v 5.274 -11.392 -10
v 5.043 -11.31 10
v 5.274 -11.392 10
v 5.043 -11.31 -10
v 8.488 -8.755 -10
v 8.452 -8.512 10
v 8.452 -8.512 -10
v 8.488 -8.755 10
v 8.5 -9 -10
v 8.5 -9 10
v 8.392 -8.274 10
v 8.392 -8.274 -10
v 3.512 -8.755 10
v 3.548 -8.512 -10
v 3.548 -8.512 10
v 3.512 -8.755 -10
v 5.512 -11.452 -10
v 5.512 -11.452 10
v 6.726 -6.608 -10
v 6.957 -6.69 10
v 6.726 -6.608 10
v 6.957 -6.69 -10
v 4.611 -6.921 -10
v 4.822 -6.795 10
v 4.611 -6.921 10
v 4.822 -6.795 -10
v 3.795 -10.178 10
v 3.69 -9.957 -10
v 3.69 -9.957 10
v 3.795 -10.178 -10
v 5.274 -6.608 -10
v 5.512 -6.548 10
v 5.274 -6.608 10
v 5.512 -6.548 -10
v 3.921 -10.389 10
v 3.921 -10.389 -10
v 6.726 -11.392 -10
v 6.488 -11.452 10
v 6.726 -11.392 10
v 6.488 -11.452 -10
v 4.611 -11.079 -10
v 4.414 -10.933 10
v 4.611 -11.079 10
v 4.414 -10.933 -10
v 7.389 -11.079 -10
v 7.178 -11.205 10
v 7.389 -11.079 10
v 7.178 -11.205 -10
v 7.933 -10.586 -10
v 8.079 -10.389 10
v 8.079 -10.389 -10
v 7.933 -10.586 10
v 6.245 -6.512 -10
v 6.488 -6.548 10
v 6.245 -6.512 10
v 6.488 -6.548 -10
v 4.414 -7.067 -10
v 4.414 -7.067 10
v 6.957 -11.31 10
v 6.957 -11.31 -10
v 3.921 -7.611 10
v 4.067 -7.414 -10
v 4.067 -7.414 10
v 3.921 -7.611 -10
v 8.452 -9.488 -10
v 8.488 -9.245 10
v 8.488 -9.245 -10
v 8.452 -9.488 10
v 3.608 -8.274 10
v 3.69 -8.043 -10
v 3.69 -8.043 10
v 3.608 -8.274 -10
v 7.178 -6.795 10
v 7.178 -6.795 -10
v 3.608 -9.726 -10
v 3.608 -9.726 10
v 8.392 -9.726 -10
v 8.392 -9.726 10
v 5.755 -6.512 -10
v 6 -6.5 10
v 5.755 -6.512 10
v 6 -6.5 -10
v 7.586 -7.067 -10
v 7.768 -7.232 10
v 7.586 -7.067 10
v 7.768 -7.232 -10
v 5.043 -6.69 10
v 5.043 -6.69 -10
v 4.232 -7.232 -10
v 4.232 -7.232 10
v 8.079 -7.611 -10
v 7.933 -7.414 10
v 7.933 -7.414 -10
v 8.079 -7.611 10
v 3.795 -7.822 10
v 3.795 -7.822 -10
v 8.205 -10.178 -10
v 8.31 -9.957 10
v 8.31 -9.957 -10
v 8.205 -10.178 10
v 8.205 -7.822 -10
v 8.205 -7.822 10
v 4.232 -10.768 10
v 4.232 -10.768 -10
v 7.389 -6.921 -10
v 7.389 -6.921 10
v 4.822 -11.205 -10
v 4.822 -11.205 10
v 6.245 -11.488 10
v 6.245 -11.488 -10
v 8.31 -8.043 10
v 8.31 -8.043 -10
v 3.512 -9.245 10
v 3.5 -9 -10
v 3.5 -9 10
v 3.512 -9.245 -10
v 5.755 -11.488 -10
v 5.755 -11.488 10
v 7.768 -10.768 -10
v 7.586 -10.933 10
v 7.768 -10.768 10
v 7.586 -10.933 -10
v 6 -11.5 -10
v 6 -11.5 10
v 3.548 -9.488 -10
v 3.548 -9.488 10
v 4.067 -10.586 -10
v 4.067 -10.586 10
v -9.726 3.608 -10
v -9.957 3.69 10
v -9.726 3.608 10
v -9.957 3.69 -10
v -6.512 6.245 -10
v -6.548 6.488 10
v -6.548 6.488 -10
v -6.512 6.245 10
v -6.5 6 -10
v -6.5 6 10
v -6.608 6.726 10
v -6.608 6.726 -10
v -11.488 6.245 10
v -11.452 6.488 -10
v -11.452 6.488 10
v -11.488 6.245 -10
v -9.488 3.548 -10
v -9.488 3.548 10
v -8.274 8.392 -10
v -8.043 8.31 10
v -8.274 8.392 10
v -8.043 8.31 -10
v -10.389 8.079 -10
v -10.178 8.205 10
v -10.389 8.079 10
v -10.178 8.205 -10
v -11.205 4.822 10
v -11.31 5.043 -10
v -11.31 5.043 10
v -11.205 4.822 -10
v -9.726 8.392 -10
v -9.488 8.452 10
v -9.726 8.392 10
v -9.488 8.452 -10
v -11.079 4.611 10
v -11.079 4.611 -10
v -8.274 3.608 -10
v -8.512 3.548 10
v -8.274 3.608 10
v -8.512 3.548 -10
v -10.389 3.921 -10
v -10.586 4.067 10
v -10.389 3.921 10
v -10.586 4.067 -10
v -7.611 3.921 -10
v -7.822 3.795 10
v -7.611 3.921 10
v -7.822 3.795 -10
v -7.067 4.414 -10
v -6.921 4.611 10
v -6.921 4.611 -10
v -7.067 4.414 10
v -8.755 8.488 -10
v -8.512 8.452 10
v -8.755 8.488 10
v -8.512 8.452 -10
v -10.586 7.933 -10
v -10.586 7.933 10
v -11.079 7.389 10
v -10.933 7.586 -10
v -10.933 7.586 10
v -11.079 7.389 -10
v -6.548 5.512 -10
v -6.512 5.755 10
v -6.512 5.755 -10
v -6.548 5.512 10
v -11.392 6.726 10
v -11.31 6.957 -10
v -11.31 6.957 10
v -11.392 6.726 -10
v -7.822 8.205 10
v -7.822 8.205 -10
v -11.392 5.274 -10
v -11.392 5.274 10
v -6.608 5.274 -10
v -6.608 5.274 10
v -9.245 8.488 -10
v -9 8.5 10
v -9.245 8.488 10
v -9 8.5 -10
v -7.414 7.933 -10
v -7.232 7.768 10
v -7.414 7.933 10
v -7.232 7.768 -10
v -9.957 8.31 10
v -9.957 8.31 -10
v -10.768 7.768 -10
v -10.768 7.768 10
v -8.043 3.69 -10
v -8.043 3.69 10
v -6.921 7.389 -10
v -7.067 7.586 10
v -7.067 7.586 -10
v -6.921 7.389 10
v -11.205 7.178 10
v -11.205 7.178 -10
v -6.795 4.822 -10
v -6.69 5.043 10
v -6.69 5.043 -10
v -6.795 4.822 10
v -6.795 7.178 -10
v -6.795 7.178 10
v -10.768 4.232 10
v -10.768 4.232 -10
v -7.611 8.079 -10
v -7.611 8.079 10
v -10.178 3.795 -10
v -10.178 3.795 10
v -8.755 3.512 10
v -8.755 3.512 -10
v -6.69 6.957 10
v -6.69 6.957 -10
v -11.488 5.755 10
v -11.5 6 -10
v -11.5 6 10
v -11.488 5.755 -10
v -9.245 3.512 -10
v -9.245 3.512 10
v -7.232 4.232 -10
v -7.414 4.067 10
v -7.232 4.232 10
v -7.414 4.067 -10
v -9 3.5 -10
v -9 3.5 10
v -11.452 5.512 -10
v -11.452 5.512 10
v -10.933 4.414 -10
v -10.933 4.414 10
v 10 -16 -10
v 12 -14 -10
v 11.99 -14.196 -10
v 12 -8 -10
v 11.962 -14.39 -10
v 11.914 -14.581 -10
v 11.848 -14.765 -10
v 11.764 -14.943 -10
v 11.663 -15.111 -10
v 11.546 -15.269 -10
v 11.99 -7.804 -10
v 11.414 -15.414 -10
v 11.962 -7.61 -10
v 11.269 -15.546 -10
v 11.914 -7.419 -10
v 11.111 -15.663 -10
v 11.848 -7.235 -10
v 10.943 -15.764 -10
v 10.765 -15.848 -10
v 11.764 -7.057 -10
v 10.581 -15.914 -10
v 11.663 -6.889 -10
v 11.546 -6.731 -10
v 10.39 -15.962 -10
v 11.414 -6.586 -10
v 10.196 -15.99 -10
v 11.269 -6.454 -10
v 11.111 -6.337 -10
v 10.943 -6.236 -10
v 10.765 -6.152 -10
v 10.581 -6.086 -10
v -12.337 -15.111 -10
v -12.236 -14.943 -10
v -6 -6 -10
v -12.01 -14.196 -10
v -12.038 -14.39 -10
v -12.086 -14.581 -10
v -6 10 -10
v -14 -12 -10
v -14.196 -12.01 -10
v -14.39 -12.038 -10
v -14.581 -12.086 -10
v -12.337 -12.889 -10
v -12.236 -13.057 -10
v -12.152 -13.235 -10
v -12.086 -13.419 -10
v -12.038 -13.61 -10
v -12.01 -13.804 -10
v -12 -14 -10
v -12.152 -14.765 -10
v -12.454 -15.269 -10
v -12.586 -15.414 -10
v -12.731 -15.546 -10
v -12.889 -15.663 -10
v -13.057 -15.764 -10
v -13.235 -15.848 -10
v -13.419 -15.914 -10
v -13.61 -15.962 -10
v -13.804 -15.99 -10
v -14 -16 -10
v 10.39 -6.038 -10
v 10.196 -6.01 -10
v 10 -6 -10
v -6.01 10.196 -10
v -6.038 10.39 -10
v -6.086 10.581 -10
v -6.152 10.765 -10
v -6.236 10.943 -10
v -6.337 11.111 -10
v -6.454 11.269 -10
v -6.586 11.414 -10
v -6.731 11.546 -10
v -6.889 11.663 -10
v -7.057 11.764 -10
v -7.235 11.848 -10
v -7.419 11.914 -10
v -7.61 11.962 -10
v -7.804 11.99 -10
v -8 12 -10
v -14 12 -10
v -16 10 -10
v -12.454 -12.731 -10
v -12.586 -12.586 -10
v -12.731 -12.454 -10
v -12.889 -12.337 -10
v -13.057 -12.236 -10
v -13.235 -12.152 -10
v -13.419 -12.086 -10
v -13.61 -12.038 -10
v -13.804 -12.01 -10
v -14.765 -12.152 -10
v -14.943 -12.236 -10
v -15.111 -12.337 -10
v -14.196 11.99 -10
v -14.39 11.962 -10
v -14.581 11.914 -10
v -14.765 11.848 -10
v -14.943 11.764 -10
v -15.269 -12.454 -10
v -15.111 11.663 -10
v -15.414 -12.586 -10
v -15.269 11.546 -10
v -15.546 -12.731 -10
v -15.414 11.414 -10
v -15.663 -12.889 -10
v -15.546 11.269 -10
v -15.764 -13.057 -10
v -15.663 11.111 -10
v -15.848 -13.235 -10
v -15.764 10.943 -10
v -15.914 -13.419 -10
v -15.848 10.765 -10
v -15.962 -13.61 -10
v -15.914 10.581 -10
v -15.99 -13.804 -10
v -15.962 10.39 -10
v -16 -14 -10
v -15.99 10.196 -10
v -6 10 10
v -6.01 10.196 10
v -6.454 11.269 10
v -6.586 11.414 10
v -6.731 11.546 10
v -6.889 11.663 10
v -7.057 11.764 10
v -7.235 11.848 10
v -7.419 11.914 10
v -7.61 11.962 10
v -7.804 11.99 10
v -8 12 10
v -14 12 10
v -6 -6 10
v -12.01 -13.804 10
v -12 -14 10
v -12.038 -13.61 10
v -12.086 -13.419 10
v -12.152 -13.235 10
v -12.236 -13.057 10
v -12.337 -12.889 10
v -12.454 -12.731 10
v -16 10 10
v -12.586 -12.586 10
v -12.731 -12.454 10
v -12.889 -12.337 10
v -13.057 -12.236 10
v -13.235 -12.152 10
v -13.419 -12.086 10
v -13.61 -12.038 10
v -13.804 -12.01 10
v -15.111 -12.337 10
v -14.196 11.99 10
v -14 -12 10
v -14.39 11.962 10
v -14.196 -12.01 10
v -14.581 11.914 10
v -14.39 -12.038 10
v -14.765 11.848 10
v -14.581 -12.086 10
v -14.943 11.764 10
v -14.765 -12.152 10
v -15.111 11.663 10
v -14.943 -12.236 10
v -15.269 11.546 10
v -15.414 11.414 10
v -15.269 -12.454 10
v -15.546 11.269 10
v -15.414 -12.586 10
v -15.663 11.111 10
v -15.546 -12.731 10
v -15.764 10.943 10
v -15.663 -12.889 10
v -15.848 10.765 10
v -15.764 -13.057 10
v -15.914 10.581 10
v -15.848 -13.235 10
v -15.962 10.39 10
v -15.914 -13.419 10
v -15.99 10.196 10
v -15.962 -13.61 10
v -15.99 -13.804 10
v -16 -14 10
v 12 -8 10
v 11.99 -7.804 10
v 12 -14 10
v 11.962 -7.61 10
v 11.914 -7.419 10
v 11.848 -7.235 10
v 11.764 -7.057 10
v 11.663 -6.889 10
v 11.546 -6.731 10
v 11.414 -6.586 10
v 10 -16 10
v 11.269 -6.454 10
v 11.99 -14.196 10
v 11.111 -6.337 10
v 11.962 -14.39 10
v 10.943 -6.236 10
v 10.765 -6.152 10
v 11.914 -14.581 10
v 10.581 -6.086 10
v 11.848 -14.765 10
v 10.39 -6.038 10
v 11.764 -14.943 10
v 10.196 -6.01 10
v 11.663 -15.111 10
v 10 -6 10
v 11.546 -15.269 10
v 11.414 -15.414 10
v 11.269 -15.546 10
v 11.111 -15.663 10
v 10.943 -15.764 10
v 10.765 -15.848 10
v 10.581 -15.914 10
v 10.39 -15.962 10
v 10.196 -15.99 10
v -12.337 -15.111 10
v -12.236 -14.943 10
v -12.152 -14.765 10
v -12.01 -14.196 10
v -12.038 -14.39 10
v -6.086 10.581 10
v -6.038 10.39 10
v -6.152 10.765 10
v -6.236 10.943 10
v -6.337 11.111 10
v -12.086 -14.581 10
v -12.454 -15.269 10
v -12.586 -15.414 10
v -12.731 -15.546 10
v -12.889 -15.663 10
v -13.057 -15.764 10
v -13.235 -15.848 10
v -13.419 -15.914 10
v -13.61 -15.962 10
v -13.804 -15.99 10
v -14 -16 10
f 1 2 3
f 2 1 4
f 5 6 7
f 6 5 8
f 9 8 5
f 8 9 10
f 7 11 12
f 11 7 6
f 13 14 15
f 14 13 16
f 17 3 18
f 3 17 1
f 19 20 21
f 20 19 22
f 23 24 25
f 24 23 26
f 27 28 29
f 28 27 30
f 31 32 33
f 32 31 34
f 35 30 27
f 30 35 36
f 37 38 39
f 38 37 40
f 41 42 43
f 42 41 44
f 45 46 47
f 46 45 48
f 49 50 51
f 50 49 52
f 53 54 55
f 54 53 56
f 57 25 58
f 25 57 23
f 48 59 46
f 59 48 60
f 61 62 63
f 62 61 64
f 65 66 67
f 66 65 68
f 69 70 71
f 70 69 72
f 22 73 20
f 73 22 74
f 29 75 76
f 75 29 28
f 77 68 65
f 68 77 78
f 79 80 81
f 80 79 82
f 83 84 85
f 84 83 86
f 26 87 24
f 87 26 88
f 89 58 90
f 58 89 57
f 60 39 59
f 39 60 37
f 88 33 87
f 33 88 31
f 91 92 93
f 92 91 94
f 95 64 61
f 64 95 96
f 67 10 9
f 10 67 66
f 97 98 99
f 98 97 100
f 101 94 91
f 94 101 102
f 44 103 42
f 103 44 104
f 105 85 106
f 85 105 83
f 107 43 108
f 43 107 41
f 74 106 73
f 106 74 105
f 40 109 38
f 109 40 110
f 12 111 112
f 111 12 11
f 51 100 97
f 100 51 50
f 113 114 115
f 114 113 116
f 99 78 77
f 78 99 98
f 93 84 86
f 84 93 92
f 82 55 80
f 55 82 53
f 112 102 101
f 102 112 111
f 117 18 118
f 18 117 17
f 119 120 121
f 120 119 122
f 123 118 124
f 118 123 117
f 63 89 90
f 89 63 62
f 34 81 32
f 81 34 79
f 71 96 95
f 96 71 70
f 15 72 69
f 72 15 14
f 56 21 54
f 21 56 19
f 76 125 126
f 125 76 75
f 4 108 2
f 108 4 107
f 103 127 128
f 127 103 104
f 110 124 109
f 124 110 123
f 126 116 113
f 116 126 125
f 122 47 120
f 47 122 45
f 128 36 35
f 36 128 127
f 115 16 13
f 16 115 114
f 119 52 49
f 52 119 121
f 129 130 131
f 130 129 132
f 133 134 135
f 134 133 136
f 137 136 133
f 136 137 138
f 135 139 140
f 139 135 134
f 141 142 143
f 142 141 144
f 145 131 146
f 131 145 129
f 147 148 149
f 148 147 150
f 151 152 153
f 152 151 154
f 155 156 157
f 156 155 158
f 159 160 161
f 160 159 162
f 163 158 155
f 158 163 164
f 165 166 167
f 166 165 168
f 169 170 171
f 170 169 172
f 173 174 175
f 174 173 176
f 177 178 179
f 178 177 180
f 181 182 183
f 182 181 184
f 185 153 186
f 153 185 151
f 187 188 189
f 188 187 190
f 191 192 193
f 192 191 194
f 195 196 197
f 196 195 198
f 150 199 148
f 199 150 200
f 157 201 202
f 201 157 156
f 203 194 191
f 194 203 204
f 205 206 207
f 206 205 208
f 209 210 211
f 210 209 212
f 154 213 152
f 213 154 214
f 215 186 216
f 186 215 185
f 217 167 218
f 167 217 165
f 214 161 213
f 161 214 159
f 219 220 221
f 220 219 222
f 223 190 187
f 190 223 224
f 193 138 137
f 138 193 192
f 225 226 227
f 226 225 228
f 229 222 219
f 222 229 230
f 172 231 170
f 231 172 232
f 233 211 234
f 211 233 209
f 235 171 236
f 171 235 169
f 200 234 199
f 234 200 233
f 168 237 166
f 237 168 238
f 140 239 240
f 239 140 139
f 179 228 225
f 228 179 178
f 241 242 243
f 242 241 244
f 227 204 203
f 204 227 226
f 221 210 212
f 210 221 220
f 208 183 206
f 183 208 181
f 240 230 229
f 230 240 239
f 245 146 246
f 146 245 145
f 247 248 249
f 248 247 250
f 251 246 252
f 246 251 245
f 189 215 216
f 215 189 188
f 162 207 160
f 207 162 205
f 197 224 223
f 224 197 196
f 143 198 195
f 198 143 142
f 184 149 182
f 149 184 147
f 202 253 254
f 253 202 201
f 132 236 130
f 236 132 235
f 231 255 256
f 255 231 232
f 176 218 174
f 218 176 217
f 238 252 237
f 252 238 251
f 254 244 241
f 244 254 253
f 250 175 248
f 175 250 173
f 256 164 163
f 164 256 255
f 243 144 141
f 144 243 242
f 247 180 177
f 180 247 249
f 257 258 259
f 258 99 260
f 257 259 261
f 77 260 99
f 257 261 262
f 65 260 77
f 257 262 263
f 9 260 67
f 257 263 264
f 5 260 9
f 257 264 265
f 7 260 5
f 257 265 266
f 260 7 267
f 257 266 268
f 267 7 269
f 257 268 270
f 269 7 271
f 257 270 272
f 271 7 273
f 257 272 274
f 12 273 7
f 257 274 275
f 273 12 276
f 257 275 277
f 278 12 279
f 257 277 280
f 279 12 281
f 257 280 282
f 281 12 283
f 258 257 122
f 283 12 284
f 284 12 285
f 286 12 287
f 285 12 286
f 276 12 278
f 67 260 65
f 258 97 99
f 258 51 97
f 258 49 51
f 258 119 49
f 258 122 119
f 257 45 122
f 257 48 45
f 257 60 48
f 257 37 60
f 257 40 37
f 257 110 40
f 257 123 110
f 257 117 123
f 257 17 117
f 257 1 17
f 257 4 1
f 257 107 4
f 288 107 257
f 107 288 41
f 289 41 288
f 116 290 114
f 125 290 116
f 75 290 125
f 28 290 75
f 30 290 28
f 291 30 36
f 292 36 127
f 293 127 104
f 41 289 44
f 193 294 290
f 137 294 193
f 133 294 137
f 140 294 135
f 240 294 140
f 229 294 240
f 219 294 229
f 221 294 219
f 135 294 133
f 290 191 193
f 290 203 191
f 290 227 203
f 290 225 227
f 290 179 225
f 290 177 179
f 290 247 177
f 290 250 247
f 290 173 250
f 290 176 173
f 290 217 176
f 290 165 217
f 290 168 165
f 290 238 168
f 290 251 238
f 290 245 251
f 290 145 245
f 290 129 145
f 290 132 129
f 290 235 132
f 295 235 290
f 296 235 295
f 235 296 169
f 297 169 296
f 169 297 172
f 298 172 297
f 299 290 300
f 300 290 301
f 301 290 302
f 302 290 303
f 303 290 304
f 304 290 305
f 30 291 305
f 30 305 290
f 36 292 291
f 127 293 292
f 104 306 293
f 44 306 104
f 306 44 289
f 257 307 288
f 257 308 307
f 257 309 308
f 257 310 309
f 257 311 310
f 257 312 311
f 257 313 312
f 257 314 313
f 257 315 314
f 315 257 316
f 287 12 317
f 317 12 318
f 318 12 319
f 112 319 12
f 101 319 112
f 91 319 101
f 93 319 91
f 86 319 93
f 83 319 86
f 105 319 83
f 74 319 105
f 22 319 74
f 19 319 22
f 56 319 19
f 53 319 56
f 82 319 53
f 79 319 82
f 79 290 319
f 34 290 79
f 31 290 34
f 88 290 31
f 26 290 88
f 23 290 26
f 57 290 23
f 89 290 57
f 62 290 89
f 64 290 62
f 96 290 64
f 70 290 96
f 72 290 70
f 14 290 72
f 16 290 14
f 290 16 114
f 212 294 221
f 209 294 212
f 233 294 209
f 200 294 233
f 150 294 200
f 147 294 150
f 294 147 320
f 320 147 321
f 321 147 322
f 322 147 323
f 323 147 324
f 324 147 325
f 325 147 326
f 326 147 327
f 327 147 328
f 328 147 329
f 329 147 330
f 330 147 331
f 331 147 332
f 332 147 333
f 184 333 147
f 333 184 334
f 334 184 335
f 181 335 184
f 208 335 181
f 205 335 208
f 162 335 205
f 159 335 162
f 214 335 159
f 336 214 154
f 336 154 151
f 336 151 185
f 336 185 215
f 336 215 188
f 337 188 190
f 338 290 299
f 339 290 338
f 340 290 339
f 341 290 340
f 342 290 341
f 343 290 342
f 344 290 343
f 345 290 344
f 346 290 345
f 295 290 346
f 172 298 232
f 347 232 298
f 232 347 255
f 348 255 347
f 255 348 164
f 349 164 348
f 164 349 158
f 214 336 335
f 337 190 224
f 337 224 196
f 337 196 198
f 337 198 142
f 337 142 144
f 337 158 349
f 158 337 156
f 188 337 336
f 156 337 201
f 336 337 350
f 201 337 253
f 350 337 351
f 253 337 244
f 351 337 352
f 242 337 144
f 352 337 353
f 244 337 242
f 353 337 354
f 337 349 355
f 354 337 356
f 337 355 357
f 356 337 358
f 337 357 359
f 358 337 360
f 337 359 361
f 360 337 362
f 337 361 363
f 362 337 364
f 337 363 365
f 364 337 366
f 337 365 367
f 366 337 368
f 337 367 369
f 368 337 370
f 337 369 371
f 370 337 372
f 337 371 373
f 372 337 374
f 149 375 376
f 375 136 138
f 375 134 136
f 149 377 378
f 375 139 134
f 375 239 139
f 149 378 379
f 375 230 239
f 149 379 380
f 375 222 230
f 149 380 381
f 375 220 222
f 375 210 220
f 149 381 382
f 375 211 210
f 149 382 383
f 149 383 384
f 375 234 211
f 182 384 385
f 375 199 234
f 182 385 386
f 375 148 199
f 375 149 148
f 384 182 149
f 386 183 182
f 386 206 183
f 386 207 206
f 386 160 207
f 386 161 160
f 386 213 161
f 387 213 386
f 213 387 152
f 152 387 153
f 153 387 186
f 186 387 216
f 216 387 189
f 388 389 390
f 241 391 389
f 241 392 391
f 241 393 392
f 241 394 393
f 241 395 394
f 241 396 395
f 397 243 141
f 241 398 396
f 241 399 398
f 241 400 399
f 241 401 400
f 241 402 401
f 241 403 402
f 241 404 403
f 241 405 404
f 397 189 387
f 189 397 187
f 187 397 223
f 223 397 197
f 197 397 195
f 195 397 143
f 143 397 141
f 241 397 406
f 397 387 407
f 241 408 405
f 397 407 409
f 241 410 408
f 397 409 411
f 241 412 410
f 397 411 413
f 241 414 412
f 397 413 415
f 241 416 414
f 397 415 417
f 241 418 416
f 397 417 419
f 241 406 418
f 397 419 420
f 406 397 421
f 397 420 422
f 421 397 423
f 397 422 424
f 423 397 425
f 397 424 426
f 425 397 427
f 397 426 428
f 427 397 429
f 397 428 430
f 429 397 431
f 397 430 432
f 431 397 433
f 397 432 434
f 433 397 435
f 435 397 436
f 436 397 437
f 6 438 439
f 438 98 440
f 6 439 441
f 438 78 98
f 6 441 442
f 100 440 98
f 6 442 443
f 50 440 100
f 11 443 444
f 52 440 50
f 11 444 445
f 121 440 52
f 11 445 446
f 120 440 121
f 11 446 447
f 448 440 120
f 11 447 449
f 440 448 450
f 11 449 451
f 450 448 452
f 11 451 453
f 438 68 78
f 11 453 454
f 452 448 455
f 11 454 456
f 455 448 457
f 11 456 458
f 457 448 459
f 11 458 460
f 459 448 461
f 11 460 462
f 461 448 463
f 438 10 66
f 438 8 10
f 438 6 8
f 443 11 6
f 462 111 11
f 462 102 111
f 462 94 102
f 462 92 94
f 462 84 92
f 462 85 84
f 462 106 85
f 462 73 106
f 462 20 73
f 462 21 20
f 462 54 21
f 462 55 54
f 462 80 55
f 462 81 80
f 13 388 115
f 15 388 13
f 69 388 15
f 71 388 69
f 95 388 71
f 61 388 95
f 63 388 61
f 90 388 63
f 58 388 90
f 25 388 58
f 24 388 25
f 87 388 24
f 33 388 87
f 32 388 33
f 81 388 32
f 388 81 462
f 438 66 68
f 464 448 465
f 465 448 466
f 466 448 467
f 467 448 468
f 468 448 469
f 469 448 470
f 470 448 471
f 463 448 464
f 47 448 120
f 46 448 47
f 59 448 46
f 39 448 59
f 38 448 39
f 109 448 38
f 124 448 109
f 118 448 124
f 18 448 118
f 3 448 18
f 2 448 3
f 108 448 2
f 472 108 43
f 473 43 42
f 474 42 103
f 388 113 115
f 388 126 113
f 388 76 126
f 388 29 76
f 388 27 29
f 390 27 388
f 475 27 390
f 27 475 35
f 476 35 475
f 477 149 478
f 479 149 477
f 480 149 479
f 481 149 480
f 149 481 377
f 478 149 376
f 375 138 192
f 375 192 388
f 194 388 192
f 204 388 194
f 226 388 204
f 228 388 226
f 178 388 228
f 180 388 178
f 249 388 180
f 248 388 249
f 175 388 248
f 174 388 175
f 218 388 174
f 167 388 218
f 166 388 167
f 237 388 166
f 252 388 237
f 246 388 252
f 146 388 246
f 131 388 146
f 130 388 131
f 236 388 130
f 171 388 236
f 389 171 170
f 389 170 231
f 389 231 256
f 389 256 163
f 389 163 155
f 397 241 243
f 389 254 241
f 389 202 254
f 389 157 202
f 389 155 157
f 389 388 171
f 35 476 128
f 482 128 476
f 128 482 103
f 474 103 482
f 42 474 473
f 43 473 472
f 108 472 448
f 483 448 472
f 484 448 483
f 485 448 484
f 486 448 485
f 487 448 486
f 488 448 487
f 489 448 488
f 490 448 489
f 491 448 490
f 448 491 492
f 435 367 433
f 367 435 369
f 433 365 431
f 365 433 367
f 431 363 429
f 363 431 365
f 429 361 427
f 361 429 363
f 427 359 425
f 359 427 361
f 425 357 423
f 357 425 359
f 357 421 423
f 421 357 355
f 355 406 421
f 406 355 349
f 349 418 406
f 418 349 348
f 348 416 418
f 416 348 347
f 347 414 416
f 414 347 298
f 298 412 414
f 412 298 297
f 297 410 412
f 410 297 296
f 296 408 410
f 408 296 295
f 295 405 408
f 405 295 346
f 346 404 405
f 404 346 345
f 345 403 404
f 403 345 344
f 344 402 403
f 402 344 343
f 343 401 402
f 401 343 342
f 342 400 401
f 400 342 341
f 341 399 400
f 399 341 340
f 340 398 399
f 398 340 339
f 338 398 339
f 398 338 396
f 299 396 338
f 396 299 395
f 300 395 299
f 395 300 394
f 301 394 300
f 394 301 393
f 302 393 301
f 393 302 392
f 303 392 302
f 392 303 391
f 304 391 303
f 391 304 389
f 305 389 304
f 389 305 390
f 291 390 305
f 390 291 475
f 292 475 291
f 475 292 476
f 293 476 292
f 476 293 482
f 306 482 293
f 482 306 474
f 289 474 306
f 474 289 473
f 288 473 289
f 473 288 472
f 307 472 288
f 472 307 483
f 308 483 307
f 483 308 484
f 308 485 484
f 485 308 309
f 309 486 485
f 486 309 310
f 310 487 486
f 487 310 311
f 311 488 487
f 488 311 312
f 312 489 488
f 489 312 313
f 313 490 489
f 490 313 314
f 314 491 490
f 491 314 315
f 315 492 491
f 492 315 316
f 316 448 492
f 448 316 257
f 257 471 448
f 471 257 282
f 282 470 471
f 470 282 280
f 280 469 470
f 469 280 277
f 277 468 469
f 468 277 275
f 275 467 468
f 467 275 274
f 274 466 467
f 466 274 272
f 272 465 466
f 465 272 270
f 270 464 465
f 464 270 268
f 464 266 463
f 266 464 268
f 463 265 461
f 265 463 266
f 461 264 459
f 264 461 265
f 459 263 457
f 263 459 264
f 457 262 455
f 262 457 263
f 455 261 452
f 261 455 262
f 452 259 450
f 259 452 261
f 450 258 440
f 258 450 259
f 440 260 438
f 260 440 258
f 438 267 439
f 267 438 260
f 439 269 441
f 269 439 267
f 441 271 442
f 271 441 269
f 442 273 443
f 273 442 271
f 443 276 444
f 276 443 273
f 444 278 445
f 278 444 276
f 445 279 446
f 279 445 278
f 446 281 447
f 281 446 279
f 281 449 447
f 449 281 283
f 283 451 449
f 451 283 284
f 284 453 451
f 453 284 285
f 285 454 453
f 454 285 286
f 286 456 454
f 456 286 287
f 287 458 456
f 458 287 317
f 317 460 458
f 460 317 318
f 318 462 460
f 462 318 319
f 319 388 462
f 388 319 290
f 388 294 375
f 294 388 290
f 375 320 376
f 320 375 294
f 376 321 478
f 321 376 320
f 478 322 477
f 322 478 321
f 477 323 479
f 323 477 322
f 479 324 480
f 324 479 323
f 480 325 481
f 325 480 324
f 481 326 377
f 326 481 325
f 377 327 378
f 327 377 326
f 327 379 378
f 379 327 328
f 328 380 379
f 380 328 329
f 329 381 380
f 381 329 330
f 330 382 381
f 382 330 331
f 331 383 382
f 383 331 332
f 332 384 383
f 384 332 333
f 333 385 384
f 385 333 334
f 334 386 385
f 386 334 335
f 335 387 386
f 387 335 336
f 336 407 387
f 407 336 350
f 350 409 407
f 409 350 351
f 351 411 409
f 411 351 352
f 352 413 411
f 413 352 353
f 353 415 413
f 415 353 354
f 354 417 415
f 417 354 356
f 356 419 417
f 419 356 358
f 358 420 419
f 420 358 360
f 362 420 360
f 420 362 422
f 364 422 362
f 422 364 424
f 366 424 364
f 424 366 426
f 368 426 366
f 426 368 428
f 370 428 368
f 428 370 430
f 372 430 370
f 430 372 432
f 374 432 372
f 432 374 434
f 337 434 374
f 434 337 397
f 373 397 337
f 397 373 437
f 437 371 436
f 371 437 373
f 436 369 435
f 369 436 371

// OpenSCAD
$fn = 64;

// Target overall bracket size (X,Y,Z) = [28,28,20]
size_x = 28;
size_y = 28;
size_z = 20;

// Leg thickness (planar width of each leg)
leg_w = 10;

// Inner corner relief radius (concave)
inner_relief_r = 2;

// Outer corner rounding radius (convex) to avoid razor edges
outer_round_r = 2;

// Mounting holes (through Z)
hole_d = 5;
hole_edge_margin = 6;   // from outer edges to hole center
hole_from_inner = 8;    // minimum from inner corner to hole center along each leg

// Small overlap to guarantee manifold unions/differences
eps = 0.25;

function clamp(v, lo, hi) = max(lo, min(hi, v));

module l_profile_2d() {
    // L shape in +X,+Y quadrant with inner corner at (0,0)
    // Add outer rounding by minkowski, then cut inner relief.
    difference() {
        // Outer rounding (convex) on the L outline
        minkowski() {
            union() {
                square([size_x - 2*outer_round_r, leg_w - 2*outer_round_r], center=false);
                square([leg_w - 2*outer_round_r, size_y - 2*outer_round_r], center=false);
            }
            circle(r=outer_round_r);
        }

        // Inner corner relief (concave quarter-circle cut)
        // Place circle at inner corner; only the part inside the L is removed.
        translate([0, 0]) circle(r=inner_relief_r);
    }
}

module l_bracket_body() {
    // Extrude the 2D profile to Z
    linear_extrude(height=size_z, center=true, convexity=10)
        l_profile_2d();
}

module mounting_holes() {
    // Hole centers computed from dimensions (no arbitrary offsets)
    // X-leg hole: near +X outer edge, centered in leg width
    hx1 = clamp(size_x - hole_edge_margin, hole_from_inner, size_x - hole_from_inner);
    hy1 = leg_w/2;

    // Y-leg hole: near +Y outer edge, centered in leg width
    hx2 = leg_w/2;
    hy2 = clamp(size_y - hole_edge_margin, hole_from_inner, size_y - hole_from_inner);

    translate([hx1, hy1, 0])
        cylinder(d=hole_d, h=size_z + 2*eps, center=true);

    translate([hx2, hy2, 0])
        cylinder(d=hole_d, h=size_z + 2*eps, center=true);
}

module extrusion_corner_bracket() {
    // Build in +X,+Y then shift so overall bounding box is centered at origin
    translate([-size_x/2, -size_y/2, 0])
    difference() {
        l_bracket_body();
        mounting_holes();
    }
}

extrusion_corner_bracket();
